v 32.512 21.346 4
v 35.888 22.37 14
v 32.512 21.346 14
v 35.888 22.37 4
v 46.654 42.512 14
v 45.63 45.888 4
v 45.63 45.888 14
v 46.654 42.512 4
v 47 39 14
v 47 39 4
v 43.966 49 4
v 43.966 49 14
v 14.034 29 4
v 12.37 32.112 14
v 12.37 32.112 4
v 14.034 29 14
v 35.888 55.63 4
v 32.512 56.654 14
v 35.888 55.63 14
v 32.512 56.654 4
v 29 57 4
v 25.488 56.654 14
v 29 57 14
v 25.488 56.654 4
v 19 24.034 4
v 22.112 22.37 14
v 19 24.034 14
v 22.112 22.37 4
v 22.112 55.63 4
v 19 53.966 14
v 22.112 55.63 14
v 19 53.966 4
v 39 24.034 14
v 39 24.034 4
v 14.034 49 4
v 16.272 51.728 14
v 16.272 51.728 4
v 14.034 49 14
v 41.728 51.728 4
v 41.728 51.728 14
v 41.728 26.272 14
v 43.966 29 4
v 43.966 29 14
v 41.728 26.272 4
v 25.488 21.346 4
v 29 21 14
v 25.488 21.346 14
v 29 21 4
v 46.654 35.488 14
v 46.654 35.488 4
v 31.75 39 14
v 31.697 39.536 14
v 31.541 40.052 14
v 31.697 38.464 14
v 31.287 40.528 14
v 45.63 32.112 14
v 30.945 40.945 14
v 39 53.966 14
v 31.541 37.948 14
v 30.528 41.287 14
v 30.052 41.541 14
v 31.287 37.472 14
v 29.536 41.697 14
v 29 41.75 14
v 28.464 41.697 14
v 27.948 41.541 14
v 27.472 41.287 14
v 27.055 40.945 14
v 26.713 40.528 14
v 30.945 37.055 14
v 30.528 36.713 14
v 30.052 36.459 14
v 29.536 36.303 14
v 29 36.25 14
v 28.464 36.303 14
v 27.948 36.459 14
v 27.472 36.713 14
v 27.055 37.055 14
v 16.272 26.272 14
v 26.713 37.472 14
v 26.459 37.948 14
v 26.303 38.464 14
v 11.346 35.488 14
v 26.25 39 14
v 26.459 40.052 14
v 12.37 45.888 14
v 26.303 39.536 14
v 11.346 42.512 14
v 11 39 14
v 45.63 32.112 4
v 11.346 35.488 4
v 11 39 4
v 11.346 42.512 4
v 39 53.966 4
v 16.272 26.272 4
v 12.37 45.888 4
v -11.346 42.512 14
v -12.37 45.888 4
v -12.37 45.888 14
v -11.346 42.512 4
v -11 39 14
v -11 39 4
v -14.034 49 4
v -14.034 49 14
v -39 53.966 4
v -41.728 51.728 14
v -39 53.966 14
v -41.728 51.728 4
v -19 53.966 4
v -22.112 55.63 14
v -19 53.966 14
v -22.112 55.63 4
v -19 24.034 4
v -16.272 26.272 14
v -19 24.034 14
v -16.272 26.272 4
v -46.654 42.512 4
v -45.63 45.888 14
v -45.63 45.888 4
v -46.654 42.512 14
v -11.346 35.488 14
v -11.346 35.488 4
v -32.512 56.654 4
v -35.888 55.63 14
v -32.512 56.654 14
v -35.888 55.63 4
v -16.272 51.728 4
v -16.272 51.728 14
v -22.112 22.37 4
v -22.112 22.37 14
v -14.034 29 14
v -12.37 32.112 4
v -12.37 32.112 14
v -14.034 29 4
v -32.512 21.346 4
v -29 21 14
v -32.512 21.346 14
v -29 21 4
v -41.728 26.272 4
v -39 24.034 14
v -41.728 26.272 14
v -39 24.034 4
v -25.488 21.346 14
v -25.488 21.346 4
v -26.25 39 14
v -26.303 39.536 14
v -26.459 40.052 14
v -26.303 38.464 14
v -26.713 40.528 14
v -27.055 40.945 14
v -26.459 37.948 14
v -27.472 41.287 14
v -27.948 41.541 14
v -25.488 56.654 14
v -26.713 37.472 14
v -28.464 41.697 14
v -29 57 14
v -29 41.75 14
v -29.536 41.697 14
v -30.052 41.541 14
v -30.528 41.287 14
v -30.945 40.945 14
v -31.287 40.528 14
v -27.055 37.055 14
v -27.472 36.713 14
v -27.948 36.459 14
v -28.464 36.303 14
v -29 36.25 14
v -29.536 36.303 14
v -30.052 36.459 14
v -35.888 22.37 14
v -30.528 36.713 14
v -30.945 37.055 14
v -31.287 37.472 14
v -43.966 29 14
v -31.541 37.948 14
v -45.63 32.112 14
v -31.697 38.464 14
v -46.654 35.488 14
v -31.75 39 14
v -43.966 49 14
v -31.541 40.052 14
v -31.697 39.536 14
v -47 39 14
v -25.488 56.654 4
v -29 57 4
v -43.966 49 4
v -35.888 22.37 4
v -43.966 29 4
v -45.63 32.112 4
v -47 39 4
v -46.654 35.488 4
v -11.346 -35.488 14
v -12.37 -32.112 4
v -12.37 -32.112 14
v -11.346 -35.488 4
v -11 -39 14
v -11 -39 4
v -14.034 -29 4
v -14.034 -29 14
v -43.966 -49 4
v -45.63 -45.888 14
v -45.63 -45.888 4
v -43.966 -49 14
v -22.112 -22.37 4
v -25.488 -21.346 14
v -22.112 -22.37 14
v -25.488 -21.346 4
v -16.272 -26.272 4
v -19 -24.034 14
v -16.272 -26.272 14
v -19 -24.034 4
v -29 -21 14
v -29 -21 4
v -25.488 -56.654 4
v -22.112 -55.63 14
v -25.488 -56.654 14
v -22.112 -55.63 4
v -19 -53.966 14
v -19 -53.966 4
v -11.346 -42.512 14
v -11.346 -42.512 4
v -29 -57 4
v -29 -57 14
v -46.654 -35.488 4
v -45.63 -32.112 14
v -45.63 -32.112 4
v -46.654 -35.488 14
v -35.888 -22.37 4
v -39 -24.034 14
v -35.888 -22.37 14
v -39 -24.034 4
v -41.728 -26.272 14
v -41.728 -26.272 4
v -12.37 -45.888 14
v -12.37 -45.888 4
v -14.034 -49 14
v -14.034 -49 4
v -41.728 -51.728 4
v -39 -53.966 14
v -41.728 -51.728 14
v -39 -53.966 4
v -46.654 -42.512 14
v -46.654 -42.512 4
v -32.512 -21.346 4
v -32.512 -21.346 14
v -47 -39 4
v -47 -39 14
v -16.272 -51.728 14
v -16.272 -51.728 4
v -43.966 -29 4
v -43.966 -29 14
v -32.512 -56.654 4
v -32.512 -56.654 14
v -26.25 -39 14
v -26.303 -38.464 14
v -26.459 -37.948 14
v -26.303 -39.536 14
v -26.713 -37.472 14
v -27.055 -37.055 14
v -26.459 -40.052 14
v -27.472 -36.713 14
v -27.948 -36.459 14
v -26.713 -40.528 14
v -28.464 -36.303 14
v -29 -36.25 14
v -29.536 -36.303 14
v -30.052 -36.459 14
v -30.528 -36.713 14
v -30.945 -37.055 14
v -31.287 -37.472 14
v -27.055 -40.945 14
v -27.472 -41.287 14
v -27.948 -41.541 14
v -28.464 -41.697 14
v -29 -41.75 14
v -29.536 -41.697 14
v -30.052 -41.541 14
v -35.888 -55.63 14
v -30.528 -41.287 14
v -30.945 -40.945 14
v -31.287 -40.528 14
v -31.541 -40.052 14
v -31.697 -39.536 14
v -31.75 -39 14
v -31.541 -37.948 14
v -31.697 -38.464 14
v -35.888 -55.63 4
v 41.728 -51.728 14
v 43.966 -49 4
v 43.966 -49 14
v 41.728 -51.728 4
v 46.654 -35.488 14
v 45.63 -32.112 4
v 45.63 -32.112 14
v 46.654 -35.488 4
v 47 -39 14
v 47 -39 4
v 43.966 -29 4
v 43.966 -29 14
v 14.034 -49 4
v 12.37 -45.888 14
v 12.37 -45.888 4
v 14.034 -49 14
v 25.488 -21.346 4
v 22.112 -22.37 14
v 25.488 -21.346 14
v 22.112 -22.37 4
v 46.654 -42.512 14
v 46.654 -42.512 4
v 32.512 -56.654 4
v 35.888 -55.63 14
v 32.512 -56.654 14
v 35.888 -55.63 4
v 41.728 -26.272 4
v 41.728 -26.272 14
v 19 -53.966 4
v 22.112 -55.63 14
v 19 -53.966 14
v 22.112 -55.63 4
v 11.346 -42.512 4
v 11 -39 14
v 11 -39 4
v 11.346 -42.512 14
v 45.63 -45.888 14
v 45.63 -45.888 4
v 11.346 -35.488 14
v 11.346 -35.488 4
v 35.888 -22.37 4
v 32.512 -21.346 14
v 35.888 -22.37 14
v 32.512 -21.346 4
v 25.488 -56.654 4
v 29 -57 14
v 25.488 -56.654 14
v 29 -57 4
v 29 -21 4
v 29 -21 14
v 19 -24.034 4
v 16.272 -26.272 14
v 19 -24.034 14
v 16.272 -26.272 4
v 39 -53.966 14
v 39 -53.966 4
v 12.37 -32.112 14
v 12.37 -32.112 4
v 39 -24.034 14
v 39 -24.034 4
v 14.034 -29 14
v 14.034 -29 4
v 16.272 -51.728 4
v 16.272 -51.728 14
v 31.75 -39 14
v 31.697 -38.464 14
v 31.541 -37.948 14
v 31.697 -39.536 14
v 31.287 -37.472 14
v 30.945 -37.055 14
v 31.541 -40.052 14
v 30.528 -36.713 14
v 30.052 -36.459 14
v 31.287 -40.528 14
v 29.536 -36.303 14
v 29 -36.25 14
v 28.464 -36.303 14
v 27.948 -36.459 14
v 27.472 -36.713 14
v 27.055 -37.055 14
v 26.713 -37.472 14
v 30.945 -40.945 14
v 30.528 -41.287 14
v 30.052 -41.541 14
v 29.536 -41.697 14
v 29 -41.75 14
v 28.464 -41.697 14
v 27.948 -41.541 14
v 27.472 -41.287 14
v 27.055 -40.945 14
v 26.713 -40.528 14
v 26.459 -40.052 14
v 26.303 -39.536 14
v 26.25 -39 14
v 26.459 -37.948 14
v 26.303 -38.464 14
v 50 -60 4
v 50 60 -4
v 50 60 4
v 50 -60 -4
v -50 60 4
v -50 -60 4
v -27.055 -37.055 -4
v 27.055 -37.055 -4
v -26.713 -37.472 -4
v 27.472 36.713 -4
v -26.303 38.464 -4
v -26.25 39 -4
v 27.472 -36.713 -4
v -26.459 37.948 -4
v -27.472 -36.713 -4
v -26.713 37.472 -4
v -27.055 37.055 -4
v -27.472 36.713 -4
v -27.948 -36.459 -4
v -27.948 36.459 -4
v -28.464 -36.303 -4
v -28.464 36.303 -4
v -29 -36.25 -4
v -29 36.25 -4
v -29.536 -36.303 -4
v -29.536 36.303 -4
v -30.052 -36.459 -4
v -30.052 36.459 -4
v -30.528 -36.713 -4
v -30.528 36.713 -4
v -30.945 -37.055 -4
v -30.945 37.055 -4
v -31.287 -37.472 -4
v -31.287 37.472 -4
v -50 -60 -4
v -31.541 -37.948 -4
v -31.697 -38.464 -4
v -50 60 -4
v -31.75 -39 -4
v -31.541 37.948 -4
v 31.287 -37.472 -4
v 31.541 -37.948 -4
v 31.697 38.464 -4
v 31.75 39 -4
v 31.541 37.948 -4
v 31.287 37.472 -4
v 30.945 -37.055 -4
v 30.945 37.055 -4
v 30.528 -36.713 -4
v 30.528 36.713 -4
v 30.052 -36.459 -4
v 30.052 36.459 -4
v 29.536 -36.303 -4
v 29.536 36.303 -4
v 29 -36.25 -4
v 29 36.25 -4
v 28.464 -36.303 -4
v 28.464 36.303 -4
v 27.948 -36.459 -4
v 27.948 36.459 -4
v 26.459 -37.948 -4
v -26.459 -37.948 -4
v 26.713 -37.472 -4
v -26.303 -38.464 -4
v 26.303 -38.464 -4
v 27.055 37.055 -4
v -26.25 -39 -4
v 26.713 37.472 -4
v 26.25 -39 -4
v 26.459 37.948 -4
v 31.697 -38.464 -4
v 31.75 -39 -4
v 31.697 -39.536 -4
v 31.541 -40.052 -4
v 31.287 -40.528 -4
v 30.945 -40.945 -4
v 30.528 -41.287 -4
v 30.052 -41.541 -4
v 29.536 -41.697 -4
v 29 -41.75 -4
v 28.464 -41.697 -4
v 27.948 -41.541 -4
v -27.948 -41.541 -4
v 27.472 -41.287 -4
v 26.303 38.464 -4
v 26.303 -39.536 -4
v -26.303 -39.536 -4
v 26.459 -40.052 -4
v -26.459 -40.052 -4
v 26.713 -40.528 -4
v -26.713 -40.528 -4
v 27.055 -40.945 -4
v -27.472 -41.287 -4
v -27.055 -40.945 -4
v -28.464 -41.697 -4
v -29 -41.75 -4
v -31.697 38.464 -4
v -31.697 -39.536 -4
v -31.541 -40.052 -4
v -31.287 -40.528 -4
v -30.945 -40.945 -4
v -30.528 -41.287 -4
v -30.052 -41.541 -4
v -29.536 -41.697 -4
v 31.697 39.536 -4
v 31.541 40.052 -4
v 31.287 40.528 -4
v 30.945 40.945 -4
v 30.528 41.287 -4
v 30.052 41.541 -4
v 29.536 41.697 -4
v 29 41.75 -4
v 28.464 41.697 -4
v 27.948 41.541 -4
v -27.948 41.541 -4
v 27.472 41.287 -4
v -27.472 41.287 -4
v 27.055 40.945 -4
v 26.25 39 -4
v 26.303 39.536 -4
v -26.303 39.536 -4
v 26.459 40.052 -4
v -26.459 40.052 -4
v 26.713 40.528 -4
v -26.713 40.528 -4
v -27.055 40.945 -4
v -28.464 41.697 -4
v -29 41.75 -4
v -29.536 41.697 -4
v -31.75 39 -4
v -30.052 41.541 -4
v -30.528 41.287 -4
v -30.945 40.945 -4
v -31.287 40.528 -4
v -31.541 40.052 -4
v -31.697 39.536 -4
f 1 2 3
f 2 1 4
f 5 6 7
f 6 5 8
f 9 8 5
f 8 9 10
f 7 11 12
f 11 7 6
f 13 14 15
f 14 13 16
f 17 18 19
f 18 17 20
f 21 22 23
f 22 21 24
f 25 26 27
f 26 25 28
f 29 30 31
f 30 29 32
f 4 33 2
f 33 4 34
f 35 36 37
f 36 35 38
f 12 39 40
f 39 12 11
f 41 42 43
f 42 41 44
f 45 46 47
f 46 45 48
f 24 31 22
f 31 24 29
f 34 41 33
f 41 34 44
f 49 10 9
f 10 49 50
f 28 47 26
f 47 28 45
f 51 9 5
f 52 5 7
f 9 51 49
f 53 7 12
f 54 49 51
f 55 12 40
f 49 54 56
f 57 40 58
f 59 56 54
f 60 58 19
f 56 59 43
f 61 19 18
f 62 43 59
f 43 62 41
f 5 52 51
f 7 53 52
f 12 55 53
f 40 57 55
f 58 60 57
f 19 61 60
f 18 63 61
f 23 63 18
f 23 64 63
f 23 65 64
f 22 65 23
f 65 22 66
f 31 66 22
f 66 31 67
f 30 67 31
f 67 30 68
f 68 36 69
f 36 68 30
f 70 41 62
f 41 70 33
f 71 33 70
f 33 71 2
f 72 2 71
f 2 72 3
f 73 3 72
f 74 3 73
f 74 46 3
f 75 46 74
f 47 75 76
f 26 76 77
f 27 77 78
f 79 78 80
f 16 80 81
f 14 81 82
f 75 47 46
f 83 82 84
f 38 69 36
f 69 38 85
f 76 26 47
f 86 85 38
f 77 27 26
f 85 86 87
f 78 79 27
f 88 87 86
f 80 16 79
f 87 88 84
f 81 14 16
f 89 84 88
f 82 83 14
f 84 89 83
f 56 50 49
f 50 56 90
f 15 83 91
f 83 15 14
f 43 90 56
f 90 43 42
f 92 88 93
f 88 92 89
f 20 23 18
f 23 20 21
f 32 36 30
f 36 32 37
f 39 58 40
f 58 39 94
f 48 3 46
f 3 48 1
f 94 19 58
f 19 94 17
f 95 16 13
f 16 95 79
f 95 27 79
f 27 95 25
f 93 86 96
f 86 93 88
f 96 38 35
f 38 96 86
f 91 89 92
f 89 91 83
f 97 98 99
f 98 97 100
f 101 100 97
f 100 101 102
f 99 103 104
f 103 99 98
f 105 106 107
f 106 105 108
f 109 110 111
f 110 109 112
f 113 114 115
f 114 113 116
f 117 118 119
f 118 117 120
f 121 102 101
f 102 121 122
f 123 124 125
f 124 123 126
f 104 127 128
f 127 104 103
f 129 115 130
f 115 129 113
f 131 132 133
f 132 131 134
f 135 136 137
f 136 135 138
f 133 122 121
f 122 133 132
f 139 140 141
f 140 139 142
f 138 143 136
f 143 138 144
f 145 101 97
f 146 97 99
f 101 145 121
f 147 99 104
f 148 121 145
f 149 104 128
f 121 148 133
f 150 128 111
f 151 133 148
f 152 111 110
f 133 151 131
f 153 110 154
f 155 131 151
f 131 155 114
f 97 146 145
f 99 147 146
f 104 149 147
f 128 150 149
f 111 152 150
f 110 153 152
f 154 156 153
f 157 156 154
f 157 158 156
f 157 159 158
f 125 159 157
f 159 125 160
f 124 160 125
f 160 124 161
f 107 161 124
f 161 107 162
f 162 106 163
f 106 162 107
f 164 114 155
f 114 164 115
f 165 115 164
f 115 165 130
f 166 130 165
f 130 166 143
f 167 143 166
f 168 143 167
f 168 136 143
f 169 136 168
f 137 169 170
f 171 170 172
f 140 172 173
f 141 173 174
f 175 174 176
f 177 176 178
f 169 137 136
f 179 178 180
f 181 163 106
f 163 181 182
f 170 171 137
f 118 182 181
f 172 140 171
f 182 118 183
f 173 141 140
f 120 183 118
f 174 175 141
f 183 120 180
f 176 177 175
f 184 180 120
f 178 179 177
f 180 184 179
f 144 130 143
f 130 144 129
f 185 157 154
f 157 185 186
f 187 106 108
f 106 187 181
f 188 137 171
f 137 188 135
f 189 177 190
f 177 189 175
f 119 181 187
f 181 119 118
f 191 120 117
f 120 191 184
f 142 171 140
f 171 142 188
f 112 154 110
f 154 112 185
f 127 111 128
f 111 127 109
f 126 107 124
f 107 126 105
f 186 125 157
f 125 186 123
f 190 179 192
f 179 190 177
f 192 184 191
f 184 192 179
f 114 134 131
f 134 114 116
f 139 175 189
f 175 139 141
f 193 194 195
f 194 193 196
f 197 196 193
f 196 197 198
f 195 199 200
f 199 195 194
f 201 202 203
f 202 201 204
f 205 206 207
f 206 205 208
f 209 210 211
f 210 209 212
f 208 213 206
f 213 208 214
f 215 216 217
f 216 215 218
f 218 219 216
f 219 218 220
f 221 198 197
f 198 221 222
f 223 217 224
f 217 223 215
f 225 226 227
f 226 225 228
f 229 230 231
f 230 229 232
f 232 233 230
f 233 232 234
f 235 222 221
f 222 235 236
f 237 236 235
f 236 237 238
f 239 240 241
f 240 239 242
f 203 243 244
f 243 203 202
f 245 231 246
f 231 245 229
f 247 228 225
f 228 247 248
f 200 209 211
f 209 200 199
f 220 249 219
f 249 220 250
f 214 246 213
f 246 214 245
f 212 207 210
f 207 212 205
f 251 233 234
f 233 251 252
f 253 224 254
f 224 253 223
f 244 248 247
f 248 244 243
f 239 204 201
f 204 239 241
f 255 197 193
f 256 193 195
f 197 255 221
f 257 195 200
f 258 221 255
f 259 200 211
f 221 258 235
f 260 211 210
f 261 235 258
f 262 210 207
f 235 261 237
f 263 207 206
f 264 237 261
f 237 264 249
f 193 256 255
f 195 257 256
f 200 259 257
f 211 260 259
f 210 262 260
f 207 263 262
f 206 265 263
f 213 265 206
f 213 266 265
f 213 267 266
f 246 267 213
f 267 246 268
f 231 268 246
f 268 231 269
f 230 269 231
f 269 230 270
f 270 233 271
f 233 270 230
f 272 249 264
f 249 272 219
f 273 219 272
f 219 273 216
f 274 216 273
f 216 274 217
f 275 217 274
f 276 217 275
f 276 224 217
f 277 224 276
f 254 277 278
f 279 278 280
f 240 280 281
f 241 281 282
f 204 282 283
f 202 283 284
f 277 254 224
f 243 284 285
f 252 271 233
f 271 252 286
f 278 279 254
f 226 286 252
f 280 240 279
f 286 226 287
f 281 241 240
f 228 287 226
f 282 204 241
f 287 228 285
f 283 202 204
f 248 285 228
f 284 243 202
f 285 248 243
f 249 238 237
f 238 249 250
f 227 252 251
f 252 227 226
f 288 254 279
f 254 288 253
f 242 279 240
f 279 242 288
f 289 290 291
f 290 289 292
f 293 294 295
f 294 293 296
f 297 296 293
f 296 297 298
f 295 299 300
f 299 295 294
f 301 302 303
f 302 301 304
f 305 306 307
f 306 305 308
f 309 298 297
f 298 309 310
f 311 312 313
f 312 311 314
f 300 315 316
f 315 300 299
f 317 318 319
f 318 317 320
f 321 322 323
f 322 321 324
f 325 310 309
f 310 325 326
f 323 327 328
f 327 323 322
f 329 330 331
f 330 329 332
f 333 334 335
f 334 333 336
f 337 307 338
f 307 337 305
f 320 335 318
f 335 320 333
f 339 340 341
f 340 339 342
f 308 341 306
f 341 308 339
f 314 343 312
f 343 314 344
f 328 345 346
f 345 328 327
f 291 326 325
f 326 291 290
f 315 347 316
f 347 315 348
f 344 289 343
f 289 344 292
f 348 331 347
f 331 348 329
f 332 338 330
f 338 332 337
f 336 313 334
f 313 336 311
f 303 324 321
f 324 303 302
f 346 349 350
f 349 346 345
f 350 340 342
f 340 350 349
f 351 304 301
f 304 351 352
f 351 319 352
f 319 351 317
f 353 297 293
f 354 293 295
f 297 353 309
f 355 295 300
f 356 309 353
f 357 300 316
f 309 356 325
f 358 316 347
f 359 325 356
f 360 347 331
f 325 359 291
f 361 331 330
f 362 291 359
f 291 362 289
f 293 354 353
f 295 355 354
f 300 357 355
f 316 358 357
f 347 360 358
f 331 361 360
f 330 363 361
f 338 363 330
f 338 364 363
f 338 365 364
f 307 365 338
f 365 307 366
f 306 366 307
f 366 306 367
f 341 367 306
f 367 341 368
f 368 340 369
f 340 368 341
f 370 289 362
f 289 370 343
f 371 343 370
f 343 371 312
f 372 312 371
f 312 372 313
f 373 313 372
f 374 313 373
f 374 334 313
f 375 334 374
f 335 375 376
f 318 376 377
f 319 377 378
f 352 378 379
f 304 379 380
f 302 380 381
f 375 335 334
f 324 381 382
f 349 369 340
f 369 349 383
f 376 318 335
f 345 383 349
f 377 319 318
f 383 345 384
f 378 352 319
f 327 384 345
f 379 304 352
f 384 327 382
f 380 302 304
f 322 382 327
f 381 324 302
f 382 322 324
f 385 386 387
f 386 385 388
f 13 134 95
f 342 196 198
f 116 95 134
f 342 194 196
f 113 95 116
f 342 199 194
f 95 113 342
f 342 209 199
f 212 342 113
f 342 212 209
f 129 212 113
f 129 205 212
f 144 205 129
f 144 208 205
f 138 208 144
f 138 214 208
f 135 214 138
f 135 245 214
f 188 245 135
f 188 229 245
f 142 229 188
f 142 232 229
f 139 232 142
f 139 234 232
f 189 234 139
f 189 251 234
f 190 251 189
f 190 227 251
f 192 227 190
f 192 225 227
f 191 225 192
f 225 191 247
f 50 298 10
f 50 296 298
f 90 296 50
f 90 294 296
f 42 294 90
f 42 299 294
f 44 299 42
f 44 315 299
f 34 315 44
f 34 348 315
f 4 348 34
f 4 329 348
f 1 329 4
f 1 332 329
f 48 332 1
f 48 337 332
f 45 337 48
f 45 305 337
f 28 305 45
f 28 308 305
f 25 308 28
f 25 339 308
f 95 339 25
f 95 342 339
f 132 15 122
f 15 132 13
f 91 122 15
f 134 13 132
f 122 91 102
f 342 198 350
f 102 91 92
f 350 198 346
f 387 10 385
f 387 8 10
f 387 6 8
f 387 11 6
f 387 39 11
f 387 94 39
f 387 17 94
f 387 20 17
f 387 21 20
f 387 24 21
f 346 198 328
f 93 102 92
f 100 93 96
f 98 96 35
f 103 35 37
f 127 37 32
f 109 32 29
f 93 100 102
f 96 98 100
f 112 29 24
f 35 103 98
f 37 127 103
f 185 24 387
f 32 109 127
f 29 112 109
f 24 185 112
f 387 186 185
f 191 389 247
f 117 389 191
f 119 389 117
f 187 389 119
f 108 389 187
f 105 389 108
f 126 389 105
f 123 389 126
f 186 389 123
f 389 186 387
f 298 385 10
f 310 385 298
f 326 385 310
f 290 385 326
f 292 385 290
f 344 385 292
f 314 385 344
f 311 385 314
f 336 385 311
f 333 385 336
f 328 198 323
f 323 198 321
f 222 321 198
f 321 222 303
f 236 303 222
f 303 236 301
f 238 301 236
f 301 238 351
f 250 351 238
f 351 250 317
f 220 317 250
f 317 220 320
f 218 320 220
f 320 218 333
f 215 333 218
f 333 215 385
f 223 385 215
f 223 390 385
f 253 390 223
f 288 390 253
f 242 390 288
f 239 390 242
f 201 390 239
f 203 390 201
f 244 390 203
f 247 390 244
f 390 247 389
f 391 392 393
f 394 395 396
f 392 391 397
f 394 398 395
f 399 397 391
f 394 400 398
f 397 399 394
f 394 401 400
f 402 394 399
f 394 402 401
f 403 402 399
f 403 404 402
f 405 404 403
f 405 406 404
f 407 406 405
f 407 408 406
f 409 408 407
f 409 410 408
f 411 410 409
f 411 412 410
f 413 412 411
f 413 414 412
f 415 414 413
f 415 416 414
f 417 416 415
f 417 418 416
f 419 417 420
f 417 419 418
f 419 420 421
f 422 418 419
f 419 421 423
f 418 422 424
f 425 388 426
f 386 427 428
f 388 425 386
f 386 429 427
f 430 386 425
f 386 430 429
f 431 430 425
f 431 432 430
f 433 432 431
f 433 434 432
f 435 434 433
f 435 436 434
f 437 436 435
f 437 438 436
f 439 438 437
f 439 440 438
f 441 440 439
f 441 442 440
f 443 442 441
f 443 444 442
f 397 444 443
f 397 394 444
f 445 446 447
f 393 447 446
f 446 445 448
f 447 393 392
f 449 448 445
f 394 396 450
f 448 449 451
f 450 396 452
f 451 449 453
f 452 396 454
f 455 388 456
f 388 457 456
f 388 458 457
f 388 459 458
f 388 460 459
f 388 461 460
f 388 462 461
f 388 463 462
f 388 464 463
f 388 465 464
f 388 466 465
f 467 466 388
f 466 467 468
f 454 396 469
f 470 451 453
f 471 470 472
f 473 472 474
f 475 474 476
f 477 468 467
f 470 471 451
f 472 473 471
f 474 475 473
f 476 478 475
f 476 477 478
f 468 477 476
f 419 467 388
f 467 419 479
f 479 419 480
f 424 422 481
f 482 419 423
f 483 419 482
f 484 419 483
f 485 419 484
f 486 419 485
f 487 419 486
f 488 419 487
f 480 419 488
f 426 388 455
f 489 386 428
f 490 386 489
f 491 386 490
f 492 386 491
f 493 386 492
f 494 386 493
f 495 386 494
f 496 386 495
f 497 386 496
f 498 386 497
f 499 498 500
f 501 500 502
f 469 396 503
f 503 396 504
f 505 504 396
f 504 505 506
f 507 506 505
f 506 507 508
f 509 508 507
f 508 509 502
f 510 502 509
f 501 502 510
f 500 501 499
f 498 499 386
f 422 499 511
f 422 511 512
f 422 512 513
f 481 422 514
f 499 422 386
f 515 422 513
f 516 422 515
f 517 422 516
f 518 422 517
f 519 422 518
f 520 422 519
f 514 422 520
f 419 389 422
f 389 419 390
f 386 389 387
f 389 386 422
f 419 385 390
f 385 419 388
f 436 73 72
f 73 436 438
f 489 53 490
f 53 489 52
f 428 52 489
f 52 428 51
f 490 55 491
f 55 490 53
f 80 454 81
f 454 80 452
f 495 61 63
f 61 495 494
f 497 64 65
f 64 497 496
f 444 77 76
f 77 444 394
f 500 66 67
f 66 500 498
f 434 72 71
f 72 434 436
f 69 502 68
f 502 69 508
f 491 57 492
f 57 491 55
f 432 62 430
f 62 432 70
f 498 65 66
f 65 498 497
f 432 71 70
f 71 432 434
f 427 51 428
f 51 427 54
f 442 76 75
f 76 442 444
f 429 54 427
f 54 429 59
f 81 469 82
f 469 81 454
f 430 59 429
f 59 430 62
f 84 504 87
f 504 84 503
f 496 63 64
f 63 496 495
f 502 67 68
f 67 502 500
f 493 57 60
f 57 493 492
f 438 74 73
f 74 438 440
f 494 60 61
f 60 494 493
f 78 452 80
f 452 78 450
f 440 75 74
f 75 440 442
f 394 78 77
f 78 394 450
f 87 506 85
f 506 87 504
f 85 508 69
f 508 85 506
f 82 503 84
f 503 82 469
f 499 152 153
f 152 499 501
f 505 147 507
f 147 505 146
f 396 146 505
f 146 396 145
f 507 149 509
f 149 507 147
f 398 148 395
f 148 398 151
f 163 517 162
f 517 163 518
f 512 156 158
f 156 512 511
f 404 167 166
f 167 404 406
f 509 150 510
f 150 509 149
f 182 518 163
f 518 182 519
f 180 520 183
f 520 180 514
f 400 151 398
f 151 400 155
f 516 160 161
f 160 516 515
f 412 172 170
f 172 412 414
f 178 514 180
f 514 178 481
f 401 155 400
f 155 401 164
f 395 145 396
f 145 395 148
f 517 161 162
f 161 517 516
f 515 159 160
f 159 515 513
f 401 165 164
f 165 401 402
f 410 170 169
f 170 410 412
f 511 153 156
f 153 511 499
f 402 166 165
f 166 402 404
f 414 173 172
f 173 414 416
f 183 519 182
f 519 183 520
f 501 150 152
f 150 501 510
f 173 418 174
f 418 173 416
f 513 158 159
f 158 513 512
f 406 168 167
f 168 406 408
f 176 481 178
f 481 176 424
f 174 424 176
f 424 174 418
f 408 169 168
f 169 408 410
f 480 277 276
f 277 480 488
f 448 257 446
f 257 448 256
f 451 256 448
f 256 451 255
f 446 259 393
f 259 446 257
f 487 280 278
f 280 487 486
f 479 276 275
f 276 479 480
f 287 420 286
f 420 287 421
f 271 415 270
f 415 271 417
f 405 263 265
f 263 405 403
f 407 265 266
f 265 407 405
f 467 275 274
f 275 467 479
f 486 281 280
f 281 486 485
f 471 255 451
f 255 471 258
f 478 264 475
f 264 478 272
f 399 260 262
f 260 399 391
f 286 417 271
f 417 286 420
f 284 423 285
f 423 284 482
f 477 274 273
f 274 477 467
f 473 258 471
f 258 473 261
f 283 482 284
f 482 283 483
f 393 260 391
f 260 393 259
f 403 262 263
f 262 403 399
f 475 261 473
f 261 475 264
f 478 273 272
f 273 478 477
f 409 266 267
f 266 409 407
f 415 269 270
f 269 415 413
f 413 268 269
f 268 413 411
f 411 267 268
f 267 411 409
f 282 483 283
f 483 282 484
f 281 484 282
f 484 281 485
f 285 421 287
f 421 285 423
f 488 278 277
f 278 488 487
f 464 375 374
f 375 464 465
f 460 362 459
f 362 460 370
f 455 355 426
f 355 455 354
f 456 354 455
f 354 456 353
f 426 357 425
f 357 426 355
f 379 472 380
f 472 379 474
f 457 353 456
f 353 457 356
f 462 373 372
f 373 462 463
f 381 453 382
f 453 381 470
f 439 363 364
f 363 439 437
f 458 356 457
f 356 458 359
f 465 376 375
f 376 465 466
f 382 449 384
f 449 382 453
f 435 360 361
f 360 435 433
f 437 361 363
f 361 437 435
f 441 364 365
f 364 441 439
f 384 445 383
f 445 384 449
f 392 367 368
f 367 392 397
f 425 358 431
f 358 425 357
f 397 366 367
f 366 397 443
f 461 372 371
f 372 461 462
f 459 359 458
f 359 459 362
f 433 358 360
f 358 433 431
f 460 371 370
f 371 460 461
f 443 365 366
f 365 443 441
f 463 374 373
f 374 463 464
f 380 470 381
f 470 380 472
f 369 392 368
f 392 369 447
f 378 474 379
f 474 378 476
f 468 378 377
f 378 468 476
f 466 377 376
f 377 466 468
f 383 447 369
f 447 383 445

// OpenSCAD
$fn = 32;

// ----------------------------------------------------------------------
// Anchor pads 100 x 120 x 18
// four corner bosses with anchor holes
// ----------------------------------------------------------------------

// --- parameters (mm) ---
plate = [100, 120, 8];  // base plate size (x, y, z)
pads = 4;               // boss count, one per corner
edge = 21;              // boss centre offset from the plate edge
boss_d = 36;            // boss diameter
boss_h = 10;            // boss height above the base plate
hole_d = 5.5;           // hole diameter

// --- derived feature positions (mm) ---
height = plate[2] + boss_h;      // = 18   overall height of the part
corner_x = plate[0] / 2 - edge;  // = 29   boss centre X
corner_y = plate[1] / 2 - edge;  // = 39   boss centre Y
feature_centers = [
  [corner_x, corner_y],
  [-corner_x, corner_y],
  [-corner_x, -corner_y],
  [corner_x, -corner_y]
];   // boss centres, anchor holes are drilled there

// base plate, four bosses standing on it, anchor holes all the way through
difference() {
  union() {
    cube(plate, center = true);
    for (centre = feature_centers)
      translate([centre[0], centre[1], plate[2] / 2 - 1])
        cylinder(d = boss_d, h = boss_h + 1);
  }
  for (centre = feature_centers)
    translate([centre[0], centre[1], -height])
      cylinder(d = hole_d, h = 2 * height + 2);  // through boss and plate
}
